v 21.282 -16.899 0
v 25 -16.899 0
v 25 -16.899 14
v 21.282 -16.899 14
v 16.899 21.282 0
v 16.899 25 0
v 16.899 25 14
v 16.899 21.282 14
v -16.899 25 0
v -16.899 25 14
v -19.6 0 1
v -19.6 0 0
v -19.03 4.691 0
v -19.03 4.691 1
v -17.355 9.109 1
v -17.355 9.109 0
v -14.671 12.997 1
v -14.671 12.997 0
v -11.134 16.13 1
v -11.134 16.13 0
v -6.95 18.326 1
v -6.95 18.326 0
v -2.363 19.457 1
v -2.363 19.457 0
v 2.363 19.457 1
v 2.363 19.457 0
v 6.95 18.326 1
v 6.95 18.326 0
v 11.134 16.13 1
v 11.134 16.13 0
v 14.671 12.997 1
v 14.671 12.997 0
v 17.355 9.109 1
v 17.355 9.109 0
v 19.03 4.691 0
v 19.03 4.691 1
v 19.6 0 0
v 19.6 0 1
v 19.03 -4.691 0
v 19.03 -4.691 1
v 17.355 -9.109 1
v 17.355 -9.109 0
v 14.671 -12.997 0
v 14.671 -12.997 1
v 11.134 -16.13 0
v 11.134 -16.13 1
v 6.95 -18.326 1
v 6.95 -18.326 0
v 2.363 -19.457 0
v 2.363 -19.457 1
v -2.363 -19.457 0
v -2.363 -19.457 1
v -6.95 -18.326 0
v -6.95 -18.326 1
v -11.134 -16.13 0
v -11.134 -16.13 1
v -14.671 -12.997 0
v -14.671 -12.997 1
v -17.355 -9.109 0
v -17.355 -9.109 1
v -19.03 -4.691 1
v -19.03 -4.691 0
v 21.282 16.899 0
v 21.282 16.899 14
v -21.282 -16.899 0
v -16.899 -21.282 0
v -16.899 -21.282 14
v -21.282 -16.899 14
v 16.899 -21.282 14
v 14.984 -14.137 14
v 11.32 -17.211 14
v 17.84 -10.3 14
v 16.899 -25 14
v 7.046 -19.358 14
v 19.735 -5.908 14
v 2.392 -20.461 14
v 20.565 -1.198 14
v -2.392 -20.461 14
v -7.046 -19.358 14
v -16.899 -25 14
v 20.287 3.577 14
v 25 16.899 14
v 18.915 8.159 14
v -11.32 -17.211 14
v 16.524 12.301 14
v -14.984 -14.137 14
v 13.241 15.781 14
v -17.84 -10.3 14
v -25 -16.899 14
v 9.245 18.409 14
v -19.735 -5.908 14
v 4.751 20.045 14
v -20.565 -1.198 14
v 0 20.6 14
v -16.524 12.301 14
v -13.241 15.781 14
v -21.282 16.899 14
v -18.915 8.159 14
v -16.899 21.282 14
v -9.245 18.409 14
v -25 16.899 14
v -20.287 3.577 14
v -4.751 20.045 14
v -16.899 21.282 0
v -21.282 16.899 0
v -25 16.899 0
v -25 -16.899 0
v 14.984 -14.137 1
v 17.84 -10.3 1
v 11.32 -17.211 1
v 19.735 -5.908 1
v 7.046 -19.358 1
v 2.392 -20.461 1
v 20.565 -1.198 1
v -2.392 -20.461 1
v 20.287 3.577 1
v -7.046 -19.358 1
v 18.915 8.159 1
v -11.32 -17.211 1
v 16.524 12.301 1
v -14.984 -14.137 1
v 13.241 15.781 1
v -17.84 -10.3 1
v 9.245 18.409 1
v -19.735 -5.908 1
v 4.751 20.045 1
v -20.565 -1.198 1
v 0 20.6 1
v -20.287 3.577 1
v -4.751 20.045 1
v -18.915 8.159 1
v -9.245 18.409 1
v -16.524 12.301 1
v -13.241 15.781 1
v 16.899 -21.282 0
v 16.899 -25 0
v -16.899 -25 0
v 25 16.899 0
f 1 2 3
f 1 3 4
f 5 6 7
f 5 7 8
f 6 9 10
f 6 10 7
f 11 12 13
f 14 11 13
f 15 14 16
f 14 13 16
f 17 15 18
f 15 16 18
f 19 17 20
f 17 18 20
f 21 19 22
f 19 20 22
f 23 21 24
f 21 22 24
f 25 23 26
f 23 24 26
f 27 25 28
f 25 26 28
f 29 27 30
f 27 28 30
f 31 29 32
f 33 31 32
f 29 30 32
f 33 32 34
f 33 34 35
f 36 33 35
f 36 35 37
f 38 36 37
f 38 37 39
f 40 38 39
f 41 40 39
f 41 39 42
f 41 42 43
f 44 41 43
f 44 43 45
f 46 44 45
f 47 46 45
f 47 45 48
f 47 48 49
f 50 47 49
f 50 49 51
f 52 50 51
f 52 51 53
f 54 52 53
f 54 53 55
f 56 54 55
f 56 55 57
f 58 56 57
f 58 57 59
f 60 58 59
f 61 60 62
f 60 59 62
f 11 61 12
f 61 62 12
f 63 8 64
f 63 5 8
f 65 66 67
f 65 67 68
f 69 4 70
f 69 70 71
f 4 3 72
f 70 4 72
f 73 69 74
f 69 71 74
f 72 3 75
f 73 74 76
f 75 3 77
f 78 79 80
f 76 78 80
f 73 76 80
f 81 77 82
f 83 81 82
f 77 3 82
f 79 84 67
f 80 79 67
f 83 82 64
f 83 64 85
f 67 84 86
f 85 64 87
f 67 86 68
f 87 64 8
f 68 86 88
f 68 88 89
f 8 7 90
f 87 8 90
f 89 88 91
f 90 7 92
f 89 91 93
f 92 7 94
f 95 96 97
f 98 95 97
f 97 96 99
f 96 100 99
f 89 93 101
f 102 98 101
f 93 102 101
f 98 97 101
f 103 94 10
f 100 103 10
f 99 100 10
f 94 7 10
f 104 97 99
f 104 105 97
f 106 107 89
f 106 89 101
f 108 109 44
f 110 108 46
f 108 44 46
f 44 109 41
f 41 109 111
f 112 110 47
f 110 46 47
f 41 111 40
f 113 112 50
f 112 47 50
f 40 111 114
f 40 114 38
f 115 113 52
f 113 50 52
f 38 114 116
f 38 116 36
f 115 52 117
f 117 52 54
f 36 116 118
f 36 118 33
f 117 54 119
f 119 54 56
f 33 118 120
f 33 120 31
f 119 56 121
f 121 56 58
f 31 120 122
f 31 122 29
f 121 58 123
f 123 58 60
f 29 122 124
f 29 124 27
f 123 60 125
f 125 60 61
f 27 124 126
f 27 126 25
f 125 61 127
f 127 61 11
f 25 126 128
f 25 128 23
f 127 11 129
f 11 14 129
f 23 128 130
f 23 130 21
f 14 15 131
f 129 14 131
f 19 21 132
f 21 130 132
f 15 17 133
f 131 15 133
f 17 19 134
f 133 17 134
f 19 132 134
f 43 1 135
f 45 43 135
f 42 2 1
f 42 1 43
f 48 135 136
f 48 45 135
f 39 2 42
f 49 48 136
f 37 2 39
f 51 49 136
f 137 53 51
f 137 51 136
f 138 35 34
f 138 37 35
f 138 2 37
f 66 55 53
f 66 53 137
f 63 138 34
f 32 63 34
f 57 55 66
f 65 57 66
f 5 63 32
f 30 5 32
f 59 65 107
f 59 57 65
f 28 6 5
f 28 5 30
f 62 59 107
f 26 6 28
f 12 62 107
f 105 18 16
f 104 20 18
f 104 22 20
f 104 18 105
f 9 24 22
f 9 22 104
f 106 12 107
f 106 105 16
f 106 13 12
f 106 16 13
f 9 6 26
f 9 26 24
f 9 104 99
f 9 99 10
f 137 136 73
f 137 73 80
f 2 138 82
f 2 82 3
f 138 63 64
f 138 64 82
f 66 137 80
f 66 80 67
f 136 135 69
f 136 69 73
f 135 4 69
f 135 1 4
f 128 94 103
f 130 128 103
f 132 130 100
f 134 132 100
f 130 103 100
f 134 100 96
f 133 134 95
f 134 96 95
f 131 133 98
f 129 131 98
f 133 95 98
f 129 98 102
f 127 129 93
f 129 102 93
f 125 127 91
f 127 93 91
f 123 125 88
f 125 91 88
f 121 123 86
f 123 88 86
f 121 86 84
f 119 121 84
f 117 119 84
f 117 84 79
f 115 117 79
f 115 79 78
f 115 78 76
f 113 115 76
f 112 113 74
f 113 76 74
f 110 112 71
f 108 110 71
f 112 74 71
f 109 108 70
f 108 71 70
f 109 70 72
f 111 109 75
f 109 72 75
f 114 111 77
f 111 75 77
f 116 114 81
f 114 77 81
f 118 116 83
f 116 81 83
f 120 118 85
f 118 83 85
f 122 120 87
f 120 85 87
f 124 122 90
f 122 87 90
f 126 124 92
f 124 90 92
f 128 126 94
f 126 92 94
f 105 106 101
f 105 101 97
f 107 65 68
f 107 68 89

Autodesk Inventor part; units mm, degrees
ref_plane "YZ Plane" through (0, 0, 0) normal (1, 0, 0) x (0, 1, 0)
ref_plane "XZ Plane" through (0, 0, 0) normal (0, 1, 0) x (-1, 0, 0)
ref_plane "XY Plane" through (0, 0, 0) normal (0, 0, 1) x (1, 0, 0)
sketch "Sketch1" plane through (0, 0, 0) normal (0, 0, 1) x (1, 0, 0)
  line L0 (-34.8609, 0) -> (34.8609, 0) construction
  line L1 (0, -34.8609) -> (0, 34.8609) construction
  line L2 (0, 0) -> (13.4339, 13.4339) construction
  line L3 (0, 0) -> (18.9985, 0) construction
  line L4 (0, 24.9006) -> (16.8, 24.9006)
  line L5 (16.8, 24.9006) -> (16.8, 21.2406)
  line L6 (16.8, 21.2406) -> (19.0203, 19.0203)
  line L7 (24.9006, 0) -> (24.9006, 16.8)
  line L8 (24.9006, 16.8) -> (21.2406, 16.8)
  line L9 (21.2406, 16.8) -> (19.0203, 19.0203)
  line L10 (0, 0) -> (-13.4339, 13.4339) construction
  line L11 (0, 0) -> (-18.9985, 0) construction
  line L12 (0, 24.9006) -> (-16.8, 24.9006)
  line L13 (-16.8, 24.9006) -> (-16.8, 21.2406)
  line L14 (-16.8, 21.2406) -> (-19.0203, 19.0203)
  line L15 (-24.9006, 0) -> (-24.9006, 16.8)
  line L16 (-24.9006, 16.8) -> (-21.2406, 16.8)
  line L17 (-21.2406, 16.8) -> (-19.0203, 19.0203)
  line L18 (0, 0) -> (13.4339, -13.4339) construction
  line L19 (0, -24.9006) -> (16.8, -24.9006)
  line L20 (16.8, -24.9006) -> (16.8, -21.2406)
  line L21 (16.8, -21.2406) -> (19.0203, -19.0203)
  line L22 (24.9006, 0) -> (24.9006, -16.8)
  line L23 (24.9006, -16.8) -> (21.2406, -16.8)
  line L24 (21.2406, -16.8) -> (19.0203, -19.0203)
  line L25 (0, 0) -> (-13.4339, -13.4339) construction
  line L26 (0, -24.9006) -> (-16.8, -24.9006)
  line L27 (-16.8, -24.9006) -> (-16.8, -21.2406)
  line L28 (-16.8, -21.2406) -> (-19.0203, -19.0203)
  line L29 (-24.9006, 0) -> (-24.9006, -16.8)
  line L30 (-24.9006, -16.8) -> (-21.2406, -16.8)
  line L31 (-21.2406, -16.8) -> (-19.0203, -19.0203)
  dimension "d0" = 45
  dimension "d1" = 3.14
  dimension "d2" = 3.66
  dimension "d3" = 16.8
extrude "Thickness" add sketch "Sketch1" along normal blind 14
hole "Hole1" at (0, 0, 0) direction (0, 0, 1) diameter 41.2 end through all
sketch "Sketch2" plane through (0, 0, 0) normal (0, 0, -1) x (-1, 0, 0)
  circle A0 centre (0, 0) radius 20.6 projected
  line L0 (16.8, 24.9006) -> (-16.8, 24.9006) projected
  line L1 (-16.8, 24.9006) -> (-16.8, 21.2406) projected
  line L2 (-16.8, 21.2406) -> (-21.2406, 16.8) projected
  line L3 (-21.2406, 16.8) -> (-24.9006, 16.8) projected
  line L4 (-24.9006, 16.8) -> (-24.9006, -16.8) projected
  line L5 (-24.9006, -16.8) -> (-21.2406, -16.8) projected
  line L6 (-21.2406, -16.8) -> (-16.8, -21.2406) projected
  line L7 (-16.8, -21.2406) -> (-16.8, -24.9006) projected
  line L8 (-16.8, -24.9006) -> (16.8, -24.9006) projected
  line L9 (16.8, -24.9006) -> (16.8, -21.2406) projected
  line L10 (16.8, -21.2406) -> (21.2406, -16.8) projected
  line L11 (21.2406, -16.8) -> (24.9006, -16.8) projected
  line L12 (24.9006, -16.8) -> (24.9006, 16.8) projected
  line L13 (24.9006, 16.8) -> (21.2406, 16.8) projected
  line L14 (21.2406, 16.8) -> (16.8, 21.2406) projected
  line L15 (16.8, 21.2406) -> (16.8, 24.9006) projected
  circle A1 centre (0, 0) radius 19.6
  dimension "d17" = 1
extrude "Extrusion2" add sketch "Sketch2" against normal blind 1 contours A0
sketch "Sketch3" plane through (0, 0, 0) normal (0, 0, -1) x (-1, 0, 0)
  circle A0 centre (0, 0) radius 20.6 projected
  line L0 (-16.8, 24.9006) -> (16.8, 24.9006) projected
  line L1 (16.8, 24.9006) -> (16.8, 21.2406) projected
  line L2 (16.8, 21.2406) -> (21.2406, 16.8) projected
  line L3 (21.2406, 16.8) -> (24.9006, 16.8) projected
  line L4 (24.9006, 16.8) -> (24.9006, -16.8) projected
  line L5 (24.9006, -16.8) -> (21.2406, -16.8) projected
  line L6 (21.2406, -16.8) -> (16.8, -21.2406) projected
  line L7 (16.8, -21.2406) -> (16.8, -24.9006) projected
  line L8 (16.8, -24.9006) -> (-16.8, -24.9006) projected
  line L9 (-16.8, -24.9006) -> (-16.8, -21.2406) projected
  line L10 (-16.8, -21.2406) -> (-21.2406, -16.8) projected
  line L11 (-21.2406, -16.8) -> (-24.9006, -16.8) projected
  line L12 (-24.9006, -16.8) -> (-24.9006, 16.8) projected
  line L13 (-24.9006, 16.8) -> (-21.2406, 16.8) projected
  line L14 (-21.2406, 16.8) -> (-16.8, 21.2406) projected
  line L15 (-16.8, 21.2406) -> (-16.8, 24.9006) projected
  line L16 (16.8994, 25) -> (-16.8994, 25)
  line L17 (-16.8994, 25) -> (-16.8994, 21.2818)
  line L18 (-16.8994, 21.2818) -> (-21.2818, 16.8994)
  line L19 (-21.2818, 16.8994) -> (-25, 16.8994)
  line L20 (-25, 16.8994) -> (-25, -16.8994)
  line L21 (-25, -16.8994) -> (-21.2818, -16.8994)
  line L22 (-21.2818, -16.8994) -> (-16.8994, -21.2818)
  line L23 (-16.8994, -21.2818) -> (-16.8994, -25)
  line L24 (-16.8994, -25) -> (16.8994, -25)
  line L25 (16.8994, -25) -> (16.8994, -21.2818)
  line L26 (16.8994, -21.2818) -> (21.2818, -16.8994)
  line L27 (21.2818, -16.8994) -> (25, -16.8994)
  line L28 (25, -16.8994) -> (25, 16.8994)
  line L29 (25, 16.8994) -> (21.2818, 16.8994)
  line L30 (21.2818, 16.8994) -> (16.8994, 21.2818)
  line L31 (16.8994, 21.2818) -> (16.8994, 25)
  dimension "d22" = 50
extrude "Extrusion3" add sketch "Sketch3" against normal up to surface (14 mm away) contours L31 L30 L29 L28 L27 L26 L25 L24 L23 L22 L21 L20 L19 L18 L17 L16
ref_plane "Arbeitsebene1" through (0, -16.8994, 0) normal (-1, 0, 0) x (0, 0, 1)
ref_plane "Arbeitsebene2" through (-16.8994, 0, 0) normal (0, 1, 0) x (1, 0, 0)
equation "\"Lens_diameter\" = 25.4"
properties part number "20_Lens_holder_DIA_50mm"
